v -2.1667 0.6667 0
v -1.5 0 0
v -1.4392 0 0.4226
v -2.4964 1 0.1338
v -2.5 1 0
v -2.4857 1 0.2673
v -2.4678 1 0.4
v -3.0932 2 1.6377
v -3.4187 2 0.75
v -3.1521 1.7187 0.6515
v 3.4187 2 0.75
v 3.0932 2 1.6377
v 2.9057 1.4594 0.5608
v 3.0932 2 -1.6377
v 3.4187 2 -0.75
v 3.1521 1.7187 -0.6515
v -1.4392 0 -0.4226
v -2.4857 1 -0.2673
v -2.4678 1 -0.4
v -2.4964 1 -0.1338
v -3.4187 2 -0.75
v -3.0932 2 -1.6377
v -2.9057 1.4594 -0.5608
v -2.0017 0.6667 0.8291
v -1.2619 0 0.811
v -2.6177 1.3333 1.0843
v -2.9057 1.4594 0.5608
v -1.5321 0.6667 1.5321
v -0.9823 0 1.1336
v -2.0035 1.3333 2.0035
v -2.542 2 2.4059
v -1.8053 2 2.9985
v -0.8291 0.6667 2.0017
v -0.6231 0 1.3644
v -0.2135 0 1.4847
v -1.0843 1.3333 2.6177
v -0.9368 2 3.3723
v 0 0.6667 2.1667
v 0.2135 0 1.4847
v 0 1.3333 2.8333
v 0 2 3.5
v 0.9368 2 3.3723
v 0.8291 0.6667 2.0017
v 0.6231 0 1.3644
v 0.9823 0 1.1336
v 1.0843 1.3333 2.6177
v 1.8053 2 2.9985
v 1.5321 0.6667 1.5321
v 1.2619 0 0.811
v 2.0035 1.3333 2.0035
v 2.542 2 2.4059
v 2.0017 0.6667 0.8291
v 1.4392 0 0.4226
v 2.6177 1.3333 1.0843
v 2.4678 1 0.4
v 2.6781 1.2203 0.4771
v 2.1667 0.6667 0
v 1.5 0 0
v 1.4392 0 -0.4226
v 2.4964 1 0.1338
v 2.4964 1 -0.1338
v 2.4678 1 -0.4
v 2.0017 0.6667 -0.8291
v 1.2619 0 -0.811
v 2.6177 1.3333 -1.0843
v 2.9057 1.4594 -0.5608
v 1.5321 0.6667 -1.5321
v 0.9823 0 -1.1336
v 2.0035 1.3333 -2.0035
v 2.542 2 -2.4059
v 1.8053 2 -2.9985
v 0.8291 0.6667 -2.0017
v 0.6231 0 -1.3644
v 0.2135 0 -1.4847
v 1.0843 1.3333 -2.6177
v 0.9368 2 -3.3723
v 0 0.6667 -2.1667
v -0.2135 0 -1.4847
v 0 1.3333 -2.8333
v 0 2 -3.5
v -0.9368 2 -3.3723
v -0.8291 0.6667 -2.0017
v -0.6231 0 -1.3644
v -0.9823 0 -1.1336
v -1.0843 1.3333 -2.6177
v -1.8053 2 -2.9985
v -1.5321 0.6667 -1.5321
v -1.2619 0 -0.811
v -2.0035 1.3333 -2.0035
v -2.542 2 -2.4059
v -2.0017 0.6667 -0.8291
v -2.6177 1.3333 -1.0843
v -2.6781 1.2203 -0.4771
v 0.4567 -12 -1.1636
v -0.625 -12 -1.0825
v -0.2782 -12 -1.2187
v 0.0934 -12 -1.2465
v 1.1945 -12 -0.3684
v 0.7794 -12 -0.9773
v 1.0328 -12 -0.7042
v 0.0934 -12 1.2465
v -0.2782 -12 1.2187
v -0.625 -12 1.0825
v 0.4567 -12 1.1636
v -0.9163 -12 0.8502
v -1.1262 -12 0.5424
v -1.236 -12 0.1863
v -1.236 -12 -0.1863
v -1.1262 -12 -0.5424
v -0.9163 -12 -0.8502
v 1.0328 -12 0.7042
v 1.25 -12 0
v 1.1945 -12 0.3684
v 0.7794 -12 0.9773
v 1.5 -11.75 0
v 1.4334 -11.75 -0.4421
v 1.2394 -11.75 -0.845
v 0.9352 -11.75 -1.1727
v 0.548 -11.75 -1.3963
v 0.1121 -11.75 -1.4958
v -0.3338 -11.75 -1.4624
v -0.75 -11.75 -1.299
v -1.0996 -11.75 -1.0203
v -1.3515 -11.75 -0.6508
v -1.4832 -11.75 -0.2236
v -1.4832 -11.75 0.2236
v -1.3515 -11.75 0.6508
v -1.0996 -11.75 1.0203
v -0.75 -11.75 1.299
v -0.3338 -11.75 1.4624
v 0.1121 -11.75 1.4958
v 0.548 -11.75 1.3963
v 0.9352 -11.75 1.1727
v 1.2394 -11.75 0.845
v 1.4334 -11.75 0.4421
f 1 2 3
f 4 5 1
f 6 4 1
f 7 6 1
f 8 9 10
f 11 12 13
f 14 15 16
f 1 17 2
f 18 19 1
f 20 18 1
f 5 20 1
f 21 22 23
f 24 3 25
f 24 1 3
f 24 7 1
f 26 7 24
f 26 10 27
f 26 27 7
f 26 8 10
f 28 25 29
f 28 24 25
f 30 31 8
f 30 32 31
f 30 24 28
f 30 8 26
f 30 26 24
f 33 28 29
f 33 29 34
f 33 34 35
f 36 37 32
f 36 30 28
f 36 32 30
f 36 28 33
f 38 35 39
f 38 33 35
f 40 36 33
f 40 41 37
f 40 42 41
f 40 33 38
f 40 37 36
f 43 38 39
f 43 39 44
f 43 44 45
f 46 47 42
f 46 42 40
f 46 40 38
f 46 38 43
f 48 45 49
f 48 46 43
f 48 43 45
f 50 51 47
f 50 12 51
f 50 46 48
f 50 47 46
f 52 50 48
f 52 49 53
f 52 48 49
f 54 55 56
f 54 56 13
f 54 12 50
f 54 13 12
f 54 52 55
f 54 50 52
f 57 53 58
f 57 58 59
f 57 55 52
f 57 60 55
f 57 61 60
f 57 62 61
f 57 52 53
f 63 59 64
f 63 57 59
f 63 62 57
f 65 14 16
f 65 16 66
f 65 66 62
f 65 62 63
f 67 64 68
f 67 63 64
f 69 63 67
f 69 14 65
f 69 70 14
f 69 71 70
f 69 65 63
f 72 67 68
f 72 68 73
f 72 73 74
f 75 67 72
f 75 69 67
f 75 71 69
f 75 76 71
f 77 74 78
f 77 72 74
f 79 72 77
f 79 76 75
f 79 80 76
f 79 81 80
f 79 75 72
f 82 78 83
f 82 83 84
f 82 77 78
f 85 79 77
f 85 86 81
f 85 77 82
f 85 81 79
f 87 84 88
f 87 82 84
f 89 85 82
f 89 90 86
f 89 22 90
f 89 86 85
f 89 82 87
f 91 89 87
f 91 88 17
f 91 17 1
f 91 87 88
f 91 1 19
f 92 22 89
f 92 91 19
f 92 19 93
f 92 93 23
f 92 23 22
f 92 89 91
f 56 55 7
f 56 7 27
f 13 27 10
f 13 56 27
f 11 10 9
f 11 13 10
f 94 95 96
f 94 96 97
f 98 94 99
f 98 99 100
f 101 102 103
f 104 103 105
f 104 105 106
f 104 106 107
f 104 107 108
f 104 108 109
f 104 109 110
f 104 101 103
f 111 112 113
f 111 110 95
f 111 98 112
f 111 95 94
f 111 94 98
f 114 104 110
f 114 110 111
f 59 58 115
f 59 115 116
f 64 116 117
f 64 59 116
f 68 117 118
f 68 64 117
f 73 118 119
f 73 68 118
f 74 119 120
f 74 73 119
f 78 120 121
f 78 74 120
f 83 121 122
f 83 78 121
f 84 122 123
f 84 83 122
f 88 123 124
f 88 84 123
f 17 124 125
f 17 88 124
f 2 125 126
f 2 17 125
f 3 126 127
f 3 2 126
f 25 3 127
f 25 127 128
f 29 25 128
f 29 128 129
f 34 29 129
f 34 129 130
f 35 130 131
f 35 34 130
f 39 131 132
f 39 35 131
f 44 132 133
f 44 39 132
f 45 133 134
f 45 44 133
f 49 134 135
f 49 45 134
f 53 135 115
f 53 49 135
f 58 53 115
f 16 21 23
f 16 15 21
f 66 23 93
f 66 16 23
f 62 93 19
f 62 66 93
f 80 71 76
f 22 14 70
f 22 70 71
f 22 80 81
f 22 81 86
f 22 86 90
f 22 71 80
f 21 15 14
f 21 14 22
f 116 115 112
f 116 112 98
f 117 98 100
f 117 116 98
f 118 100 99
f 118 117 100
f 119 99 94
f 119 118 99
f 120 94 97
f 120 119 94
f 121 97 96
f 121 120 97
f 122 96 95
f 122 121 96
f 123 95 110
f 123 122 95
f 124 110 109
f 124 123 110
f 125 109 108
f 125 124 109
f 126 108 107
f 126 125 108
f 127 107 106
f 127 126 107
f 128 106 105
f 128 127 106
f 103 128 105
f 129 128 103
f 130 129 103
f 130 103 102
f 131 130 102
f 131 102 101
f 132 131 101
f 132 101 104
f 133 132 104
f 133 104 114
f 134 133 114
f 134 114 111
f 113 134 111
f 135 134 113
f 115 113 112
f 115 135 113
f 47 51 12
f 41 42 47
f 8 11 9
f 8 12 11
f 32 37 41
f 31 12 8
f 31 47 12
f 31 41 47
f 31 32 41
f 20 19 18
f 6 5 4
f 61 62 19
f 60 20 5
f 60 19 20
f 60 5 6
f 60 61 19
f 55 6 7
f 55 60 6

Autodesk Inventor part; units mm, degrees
ref_plane "XZ Plane" through (0, 0, 0) normal (0, 1, 0) x (-1, 0, 0)
ref_plane "XY Plane" through (0, 0, 0) normal (0, 0, 1) x (1, 0, 0)
sketch "草图1" plane through (0, 0, 0) normal (0, 0, 1) x (1, 0, 0)
  line L0 (-3.5, 2) -> (0, 2)
  line L1 (0, 2) -> (0, 0)
  line L2 (0, 0) -> (-1.5, 0)
  line L3 (-1.5, 0) -> (-3.5, 2)
  line L4 (0, -0.4) -> (0, 2.4) projected
  dimension "d0" = 3.5
  dimension "d1" = 2
  dimension "d2" = 1.5
revolve "旋转1" add sketch "草图1" angle 360 about axis through (0, -10, 0) along (0, 1, 0)
sketch "草图2" plane through (0, 0, 0) normal (0, -1, 0) x (1, 0, 0)
  circle A0 centre (0, 0) radius 1.5
  dimension "d4" = 3
extrude "拉伸1" add sketch "草图2" along normal blind 12
chamfer "倒角1" distance 0.25 angle 45 1 edges at (-1.5, -12, 0)
thread "螺纹1" size "M3x0.5" class "6g" standard "ANSI Metric M Profile" full length
ref_plane "工作平面1" through (3.5, 0, 0) normal (1, 0, 0) x (0, 1, 0)
sketch "草图3" plane through (3.5, 0, 0) normal (1, 0, 0) x (0, 1, 0)
  line L0 (2, -0.75) -> (1, -0.4)
  line L1 (1, -0.4) -> (1, 0.4)
  line L2 (2, -3.5) -> (2, 3.5) projected
  line L3 (1, 0.4) -> (2, 0.75)
  line L4 (2, 0.75) -> (2, -0.75)
  point P0 (0, 0)
  point P1 (2, 0)
  dimension "d13" = 1
  dimension "d14" = 0.8
  dimension "d15" = 1.5
extrude "拉伸2" cut sketch "草图3" against normal blind 7
properties part number "载板连接销固定螺丝"
